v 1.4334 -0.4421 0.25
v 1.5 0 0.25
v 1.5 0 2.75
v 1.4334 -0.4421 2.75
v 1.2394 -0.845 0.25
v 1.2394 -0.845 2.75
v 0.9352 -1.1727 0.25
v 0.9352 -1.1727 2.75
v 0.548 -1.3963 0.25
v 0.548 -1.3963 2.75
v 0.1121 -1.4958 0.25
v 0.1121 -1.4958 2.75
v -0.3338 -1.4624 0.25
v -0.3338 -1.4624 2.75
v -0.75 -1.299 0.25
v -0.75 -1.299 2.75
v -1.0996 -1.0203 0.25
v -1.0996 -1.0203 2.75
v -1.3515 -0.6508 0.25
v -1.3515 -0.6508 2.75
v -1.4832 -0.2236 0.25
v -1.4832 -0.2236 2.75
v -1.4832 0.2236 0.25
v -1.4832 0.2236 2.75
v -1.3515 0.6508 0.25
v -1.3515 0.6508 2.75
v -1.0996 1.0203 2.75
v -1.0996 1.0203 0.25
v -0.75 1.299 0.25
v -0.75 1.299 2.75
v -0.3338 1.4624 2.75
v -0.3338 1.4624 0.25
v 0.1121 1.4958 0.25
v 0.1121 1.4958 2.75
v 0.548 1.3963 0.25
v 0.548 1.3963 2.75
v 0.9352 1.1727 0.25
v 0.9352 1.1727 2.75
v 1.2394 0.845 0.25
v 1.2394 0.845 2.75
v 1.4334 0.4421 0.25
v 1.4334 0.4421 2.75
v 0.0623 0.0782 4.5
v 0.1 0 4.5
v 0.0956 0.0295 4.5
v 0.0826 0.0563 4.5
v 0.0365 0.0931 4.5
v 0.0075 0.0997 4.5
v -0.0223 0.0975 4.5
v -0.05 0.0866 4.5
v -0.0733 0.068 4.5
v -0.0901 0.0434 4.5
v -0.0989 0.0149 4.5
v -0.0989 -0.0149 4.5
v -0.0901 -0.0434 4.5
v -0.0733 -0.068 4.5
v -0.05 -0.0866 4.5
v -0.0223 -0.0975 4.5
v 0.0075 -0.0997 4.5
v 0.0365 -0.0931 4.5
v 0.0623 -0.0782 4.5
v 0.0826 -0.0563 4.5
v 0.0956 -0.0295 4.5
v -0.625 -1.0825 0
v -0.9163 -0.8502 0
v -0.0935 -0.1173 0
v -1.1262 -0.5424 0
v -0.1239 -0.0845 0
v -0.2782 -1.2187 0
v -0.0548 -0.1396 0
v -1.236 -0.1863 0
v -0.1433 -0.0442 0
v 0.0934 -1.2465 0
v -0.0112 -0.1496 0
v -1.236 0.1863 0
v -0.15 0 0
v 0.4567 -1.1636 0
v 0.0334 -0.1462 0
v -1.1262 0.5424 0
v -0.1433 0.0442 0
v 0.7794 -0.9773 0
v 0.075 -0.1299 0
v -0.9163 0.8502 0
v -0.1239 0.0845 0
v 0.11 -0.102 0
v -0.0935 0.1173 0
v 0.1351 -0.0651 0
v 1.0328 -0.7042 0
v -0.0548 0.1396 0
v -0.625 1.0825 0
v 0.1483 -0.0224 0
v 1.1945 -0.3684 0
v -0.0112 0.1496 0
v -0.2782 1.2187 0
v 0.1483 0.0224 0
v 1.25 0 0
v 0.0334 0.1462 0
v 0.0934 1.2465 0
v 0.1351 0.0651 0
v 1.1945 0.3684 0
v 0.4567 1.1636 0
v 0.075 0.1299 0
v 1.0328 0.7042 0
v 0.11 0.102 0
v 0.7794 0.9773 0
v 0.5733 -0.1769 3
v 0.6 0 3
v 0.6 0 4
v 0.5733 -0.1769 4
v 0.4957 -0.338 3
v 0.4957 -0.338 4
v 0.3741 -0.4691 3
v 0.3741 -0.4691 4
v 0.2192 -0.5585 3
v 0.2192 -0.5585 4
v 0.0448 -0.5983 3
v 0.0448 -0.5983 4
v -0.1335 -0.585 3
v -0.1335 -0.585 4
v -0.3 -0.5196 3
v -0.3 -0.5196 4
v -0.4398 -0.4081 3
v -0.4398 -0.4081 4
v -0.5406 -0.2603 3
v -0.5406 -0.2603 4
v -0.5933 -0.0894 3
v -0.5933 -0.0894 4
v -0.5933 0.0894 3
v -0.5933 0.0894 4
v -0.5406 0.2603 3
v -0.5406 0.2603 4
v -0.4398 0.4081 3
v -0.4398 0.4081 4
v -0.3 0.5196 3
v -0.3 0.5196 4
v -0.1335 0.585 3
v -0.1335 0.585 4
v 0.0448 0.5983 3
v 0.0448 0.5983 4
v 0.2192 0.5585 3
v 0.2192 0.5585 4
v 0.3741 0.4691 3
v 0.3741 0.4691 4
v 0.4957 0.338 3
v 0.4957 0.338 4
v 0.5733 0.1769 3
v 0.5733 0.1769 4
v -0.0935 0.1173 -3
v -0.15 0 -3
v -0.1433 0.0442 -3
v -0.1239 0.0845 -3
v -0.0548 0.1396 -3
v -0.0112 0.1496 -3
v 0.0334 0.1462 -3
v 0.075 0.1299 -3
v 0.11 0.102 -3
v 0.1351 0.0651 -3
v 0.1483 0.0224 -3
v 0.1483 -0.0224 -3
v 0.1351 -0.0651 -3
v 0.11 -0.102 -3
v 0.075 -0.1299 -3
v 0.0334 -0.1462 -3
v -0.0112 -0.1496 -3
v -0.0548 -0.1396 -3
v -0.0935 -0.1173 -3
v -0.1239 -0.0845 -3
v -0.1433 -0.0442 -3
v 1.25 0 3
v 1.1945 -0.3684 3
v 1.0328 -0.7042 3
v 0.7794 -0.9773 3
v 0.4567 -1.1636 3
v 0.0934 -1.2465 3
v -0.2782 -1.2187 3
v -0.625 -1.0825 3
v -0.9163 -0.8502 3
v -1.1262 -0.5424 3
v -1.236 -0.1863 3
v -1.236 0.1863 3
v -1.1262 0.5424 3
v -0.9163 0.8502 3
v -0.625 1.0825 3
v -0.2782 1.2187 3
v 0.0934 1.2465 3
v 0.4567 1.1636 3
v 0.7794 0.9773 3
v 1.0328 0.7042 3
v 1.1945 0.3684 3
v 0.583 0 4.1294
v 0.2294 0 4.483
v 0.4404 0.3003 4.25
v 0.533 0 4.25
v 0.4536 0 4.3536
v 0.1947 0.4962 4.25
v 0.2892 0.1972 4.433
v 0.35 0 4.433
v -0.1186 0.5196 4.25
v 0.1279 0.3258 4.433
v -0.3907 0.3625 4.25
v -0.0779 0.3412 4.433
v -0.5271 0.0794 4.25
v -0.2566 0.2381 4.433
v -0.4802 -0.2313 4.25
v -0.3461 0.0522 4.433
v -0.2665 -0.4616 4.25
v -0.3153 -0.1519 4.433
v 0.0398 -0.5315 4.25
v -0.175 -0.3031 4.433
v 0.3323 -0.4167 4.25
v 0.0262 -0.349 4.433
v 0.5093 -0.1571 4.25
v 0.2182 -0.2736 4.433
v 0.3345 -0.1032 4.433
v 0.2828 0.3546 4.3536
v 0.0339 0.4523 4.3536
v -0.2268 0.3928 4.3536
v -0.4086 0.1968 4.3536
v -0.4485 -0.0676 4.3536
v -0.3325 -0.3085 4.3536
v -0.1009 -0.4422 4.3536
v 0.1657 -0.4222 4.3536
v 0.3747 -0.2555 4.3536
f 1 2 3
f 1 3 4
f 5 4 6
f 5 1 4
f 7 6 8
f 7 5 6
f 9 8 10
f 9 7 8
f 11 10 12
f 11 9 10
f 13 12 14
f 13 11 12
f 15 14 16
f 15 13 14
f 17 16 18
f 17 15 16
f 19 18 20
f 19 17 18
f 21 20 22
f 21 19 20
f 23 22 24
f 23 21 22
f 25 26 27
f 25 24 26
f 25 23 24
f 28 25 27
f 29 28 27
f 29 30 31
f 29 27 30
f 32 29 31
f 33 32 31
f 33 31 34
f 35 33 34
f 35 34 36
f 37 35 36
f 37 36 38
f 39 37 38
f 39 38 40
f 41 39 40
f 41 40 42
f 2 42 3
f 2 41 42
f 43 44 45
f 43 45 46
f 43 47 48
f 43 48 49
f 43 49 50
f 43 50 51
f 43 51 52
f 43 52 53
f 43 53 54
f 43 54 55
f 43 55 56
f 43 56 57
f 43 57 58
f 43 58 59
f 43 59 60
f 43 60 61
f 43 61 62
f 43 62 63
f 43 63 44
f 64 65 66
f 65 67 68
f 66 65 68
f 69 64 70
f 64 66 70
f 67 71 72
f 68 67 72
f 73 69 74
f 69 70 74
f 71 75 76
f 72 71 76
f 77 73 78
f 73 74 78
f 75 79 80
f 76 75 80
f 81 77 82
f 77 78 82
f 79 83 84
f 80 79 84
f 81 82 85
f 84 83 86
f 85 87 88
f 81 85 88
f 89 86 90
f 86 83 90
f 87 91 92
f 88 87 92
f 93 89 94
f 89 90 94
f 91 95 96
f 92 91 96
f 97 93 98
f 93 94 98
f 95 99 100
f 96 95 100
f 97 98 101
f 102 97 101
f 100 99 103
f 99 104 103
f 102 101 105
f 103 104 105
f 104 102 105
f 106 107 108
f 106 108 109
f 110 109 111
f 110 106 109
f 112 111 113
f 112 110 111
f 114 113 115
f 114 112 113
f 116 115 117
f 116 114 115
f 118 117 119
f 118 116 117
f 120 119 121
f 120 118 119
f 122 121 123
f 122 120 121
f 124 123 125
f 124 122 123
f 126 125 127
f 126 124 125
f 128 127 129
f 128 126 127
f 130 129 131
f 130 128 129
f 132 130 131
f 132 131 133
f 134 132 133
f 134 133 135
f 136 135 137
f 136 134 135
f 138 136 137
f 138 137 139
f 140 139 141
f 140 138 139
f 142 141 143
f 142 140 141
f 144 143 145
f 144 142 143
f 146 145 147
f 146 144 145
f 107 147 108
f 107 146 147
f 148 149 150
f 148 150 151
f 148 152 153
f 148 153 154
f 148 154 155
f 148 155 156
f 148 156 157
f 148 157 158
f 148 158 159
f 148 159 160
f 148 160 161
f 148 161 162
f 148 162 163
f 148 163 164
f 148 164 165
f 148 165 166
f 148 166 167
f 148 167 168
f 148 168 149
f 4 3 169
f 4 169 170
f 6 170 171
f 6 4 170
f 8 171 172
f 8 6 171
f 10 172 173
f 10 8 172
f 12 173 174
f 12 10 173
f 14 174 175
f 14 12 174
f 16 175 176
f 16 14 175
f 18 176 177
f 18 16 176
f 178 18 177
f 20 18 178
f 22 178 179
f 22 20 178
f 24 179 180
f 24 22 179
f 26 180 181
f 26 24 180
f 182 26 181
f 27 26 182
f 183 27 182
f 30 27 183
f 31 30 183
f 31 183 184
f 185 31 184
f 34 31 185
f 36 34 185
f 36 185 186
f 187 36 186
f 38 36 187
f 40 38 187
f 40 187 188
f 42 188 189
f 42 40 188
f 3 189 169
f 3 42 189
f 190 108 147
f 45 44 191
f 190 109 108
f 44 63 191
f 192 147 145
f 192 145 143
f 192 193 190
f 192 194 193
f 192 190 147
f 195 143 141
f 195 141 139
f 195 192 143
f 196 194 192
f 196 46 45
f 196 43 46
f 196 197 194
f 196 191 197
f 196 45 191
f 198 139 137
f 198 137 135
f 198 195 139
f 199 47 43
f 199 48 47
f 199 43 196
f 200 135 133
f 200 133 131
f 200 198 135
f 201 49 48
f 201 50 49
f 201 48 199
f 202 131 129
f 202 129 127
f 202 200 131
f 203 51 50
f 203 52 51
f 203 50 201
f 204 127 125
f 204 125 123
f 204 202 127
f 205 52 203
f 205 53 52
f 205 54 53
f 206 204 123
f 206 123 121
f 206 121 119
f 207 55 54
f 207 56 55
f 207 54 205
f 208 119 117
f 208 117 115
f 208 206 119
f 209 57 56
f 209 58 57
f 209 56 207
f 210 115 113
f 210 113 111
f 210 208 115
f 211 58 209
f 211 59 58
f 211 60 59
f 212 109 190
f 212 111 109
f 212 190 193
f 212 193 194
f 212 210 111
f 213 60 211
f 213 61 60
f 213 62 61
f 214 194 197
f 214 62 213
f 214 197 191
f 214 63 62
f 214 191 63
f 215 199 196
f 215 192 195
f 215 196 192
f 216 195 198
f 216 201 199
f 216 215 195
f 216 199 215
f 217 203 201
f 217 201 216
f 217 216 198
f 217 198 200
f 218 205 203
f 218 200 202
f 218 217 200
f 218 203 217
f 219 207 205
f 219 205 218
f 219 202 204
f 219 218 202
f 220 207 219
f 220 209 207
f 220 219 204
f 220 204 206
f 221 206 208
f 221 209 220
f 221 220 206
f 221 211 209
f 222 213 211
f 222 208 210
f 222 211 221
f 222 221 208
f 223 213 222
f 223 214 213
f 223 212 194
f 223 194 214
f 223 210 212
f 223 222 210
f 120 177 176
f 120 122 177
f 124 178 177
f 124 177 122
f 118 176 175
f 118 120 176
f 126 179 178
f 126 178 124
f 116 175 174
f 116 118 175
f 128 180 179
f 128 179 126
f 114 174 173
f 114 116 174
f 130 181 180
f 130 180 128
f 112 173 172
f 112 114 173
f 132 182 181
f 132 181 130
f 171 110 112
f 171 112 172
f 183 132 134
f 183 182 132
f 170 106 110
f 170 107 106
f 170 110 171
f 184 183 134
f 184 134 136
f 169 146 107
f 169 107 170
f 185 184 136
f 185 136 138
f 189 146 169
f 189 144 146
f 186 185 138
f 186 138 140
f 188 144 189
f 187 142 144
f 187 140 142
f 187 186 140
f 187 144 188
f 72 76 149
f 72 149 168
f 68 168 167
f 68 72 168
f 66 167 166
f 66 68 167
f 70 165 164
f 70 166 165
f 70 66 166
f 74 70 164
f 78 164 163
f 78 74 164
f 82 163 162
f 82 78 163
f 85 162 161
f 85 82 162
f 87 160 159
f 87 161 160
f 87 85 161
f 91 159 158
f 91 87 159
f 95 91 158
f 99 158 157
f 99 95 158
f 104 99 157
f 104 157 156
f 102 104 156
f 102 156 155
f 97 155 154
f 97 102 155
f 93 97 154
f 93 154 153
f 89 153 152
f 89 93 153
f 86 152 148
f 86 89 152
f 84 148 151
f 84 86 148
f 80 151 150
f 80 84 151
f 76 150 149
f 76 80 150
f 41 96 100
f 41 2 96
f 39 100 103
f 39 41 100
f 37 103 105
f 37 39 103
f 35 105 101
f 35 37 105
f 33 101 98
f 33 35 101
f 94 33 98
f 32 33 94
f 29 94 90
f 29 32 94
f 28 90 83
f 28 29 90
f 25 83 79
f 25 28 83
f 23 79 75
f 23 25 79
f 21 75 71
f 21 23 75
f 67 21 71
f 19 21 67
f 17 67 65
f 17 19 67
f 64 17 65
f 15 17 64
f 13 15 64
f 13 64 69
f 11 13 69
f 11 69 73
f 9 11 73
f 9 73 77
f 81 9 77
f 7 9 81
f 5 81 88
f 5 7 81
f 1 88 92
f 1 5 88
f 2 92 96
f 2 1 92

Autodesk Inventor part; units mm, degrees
ref_plane "YZ Plane" through (0, 0, 0) normal (1, 0, 0) x (0, 1, 0)
ref_plane "XZ Plane" through (0, 0, 0) normal (0, 1, 0) x (-1, 0, 0)
ref_plane "XY Plane" through (0, 0, 0) normal (0, 0, 1) x (1, 0, 0)
sketch "Sketch1" plane through (0, 0, 0) normal (0, 0, 1) x (1, 0, 0)
  circle A0 centre (0, 0) radius 1.5
  dimension "d0" = 3
extrude "Extrusion1" add sketch "Sketch1" along normal blind 3
chamfer "Chamfer1" distance 0.25 angle 45 2 edges at (-1.5, 0, 3) (-1.5, 0, 0)
sketch "Sketch2" plane through (0, 0, 3) normal (0, 0, 1) x (1, 0, 0)
  circle A0 centre (0, 0) radius 0.6
  dimension "d12" = 1.2
extrude "Extrusion2" add sketch "Sketch2" along normal blind 1.5
fillet "Fillet1" radius 0.5 1 edges at (-0.6, 0, 4.5)
sketch "Sketch3" plane through (0, 0, 0) normal (0, 0, -1) x (-1, 0, 0)
  circle A0 centre (0, 0) radius 0.15
  dimension "d9" = 0.3
extrude "Extrusion3" add sketch "Sketch3" along normal blind 3
properties part number "DC motor"
